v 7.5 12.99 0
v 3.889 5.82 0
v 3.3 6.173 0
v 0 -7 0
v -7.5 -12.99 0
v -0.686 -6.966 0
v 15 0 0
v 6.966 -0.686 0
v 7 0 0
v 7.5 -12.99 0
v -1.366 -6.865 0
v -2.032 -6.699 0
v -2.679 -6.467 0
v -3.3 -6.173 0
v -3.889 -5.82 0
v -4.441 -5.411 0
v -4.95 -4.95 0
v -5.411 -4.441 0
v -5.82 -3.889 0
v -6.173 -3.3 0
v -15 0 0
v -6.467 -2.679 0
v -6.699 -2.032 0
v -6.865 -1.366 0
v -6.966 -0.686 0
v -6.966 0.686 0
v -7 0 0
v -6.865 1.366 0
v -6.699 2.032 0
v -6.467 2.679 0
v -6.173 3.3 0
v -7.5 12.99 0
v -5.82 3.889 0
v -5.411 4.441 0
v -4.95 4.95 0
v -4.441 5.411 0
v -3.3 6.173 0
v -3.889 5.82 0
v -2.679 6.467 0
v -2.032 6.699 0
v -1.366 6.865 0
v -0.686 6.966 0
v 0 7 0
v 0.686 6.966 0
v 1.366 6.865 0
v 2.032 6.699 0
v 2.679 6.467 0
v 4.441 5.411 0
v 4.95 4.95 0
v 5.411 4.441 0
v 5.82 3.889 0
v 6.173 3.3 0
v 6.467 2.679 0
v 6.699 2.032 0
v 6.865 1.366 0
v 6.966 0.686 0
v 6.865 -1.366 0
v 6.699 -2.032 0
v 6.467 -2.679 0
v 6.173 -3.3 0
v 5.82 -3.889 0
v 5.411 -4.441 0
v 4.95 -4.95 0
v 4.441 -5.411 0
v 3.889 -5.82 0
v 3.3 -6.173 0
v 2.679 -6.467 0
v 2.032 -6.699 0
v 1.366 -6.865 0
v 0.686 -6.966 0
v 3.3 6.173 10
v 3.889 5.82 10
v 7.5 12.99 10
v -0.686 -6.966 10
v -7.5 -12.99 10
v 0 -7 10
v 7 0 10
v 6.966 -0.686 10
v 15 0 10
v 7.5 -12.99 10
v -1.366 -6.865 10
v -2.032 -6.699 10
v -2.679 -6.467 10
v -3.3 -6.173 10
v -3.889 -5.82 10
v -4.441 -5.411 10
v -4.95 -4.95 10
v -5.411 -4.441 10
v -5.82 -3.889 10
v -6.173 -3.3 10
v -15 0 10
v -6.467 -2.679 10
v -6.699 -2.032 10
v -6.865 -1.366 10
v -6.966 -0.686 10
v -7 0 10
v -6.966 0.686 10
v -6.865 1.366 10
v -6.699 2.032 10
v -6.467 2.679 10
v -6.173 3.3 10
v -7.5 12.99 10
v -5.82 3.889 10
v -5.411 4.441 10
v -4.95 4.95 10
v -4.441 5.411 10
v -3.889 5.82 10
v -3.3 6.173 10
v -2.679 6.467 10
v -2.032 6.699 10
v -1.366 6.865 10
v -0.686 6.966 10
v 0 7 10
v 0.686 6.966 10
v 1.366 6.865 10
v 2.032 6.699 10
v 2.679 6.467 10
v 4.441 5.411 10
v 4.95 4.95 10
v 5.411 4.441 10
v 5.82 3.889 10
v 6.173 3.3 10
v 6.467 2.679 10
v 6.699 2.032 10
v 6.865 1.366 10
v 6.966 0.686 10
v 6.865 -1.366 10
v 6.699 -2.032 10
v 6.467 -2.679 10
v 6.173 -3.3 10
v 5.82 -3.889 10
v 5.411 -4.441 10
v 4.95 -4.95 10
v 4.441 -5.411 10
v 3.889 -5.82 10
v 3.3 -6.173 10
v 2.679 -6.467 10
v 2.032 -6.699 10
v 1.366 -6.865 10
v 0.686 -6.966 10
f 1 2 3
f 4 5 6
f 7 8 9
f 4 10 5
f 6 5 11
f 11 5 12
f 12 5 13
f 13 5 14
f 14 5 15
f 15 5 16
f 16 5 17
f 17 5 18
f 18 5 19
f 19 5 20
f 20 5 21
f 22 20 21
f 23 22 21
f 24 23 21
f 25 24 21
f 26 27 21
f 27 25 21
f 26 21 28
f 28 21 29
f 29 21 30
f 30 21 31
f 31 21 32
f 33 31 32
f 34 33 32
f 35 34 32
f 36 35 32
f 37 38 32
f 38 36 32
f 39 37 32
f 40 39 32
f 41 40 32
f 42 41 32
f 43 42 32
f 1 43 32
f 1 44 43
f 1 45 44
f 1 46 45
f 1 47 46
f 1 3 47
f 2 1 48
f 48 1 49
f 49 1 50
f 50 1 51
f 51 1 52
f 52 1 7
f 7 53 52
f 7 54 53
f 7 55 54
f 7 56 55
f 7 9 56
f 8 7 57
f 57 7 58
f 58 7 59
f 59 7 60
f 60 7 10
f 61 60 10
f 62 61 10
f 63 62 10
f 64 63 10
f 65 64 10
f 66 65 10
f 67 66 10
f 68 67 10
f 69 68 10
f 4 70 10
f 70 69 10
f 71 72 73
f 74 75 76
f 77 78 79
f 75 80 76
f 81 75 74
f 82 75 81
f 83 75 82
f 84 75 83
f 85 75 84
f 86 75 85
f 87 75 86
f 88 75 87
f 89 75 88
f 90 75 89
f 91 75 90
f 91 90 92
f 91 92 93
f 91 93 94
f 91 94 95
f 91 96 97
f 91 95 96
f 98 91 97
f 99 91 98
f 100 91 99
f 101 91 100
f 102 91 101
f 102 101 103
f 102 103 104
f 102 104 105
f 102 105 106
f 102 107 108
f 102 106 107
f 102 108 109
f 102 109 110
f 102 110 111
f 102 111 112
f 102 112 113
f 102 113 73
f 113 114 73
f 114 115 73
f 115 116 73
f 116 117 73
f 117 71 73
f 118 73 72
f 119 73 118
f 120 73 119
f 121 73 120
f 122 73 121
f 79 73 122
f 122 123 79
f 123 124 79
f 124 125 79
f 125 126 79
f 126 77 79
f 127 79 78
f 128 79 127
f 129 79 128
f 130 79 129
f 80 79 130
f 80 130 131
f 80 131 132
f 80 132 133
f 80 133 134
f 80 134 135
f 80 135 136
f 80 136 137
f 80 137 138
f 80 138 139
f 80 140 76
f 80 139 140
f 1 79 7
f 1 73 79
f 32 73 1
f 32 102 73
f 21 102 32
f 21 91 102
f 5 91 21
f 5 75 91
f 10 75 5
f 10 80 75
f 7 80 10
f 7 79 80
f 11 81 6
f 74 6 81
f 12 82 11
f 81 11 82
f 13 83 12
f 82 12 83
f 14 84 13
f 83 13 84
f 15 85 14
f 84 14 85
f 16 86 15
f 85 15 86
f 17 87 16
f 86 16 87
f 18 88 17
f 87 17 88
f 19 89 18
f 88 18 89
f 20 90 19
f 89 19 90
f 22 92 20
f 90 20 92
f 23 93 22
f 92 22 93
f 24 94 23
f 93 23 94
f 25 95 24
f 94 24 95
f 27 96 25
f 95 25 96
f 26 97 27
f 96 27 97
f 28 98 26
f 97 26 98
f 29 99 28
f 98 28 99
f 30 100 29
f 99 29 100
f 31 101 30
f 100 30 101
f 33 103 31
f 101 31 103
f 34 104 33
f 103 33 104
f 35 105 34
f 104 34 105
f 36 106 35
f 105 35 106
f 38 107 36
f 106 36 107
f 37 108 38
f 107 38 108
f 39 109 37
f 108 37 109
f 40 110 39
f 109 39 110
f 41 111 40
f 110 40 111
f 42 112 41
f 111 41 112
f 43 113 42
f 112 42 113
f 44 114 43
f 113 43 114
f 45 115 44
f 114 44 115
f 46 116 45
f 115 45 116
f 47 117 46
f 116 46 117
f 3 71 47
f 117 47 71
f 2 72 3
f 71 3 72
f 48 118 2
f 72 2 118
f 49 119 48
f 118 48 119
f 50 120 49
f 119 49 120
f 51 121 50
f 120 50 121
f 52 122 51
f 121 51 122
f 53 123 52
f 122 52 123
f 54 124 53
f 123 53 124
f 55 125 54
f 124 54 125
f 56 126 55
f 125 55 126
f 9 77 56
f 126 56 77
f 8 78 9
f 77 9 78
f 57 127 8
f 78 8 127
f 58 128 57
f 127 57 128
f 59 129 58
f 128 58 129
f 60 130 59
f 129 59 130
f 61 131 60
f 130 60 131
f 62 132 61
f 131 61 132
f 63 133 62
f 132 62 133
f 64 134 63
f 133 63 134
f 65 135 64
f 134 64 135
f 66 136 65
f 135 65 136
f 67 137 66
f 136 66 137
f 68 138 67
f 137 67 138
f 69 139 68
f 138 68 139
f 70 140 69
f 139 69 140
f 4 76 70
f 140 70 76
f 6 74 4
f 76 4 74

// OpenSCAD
linear_extrude(height = 10)
  difference() {
    polygon([[15,0],[7.5,12.99],[-7.5,12.99],[-15,0],[-7.5,-12.99],[7.5,-12.99]]);
    translate([0,0]) circle(r = 7, $fn = 64);
  }
